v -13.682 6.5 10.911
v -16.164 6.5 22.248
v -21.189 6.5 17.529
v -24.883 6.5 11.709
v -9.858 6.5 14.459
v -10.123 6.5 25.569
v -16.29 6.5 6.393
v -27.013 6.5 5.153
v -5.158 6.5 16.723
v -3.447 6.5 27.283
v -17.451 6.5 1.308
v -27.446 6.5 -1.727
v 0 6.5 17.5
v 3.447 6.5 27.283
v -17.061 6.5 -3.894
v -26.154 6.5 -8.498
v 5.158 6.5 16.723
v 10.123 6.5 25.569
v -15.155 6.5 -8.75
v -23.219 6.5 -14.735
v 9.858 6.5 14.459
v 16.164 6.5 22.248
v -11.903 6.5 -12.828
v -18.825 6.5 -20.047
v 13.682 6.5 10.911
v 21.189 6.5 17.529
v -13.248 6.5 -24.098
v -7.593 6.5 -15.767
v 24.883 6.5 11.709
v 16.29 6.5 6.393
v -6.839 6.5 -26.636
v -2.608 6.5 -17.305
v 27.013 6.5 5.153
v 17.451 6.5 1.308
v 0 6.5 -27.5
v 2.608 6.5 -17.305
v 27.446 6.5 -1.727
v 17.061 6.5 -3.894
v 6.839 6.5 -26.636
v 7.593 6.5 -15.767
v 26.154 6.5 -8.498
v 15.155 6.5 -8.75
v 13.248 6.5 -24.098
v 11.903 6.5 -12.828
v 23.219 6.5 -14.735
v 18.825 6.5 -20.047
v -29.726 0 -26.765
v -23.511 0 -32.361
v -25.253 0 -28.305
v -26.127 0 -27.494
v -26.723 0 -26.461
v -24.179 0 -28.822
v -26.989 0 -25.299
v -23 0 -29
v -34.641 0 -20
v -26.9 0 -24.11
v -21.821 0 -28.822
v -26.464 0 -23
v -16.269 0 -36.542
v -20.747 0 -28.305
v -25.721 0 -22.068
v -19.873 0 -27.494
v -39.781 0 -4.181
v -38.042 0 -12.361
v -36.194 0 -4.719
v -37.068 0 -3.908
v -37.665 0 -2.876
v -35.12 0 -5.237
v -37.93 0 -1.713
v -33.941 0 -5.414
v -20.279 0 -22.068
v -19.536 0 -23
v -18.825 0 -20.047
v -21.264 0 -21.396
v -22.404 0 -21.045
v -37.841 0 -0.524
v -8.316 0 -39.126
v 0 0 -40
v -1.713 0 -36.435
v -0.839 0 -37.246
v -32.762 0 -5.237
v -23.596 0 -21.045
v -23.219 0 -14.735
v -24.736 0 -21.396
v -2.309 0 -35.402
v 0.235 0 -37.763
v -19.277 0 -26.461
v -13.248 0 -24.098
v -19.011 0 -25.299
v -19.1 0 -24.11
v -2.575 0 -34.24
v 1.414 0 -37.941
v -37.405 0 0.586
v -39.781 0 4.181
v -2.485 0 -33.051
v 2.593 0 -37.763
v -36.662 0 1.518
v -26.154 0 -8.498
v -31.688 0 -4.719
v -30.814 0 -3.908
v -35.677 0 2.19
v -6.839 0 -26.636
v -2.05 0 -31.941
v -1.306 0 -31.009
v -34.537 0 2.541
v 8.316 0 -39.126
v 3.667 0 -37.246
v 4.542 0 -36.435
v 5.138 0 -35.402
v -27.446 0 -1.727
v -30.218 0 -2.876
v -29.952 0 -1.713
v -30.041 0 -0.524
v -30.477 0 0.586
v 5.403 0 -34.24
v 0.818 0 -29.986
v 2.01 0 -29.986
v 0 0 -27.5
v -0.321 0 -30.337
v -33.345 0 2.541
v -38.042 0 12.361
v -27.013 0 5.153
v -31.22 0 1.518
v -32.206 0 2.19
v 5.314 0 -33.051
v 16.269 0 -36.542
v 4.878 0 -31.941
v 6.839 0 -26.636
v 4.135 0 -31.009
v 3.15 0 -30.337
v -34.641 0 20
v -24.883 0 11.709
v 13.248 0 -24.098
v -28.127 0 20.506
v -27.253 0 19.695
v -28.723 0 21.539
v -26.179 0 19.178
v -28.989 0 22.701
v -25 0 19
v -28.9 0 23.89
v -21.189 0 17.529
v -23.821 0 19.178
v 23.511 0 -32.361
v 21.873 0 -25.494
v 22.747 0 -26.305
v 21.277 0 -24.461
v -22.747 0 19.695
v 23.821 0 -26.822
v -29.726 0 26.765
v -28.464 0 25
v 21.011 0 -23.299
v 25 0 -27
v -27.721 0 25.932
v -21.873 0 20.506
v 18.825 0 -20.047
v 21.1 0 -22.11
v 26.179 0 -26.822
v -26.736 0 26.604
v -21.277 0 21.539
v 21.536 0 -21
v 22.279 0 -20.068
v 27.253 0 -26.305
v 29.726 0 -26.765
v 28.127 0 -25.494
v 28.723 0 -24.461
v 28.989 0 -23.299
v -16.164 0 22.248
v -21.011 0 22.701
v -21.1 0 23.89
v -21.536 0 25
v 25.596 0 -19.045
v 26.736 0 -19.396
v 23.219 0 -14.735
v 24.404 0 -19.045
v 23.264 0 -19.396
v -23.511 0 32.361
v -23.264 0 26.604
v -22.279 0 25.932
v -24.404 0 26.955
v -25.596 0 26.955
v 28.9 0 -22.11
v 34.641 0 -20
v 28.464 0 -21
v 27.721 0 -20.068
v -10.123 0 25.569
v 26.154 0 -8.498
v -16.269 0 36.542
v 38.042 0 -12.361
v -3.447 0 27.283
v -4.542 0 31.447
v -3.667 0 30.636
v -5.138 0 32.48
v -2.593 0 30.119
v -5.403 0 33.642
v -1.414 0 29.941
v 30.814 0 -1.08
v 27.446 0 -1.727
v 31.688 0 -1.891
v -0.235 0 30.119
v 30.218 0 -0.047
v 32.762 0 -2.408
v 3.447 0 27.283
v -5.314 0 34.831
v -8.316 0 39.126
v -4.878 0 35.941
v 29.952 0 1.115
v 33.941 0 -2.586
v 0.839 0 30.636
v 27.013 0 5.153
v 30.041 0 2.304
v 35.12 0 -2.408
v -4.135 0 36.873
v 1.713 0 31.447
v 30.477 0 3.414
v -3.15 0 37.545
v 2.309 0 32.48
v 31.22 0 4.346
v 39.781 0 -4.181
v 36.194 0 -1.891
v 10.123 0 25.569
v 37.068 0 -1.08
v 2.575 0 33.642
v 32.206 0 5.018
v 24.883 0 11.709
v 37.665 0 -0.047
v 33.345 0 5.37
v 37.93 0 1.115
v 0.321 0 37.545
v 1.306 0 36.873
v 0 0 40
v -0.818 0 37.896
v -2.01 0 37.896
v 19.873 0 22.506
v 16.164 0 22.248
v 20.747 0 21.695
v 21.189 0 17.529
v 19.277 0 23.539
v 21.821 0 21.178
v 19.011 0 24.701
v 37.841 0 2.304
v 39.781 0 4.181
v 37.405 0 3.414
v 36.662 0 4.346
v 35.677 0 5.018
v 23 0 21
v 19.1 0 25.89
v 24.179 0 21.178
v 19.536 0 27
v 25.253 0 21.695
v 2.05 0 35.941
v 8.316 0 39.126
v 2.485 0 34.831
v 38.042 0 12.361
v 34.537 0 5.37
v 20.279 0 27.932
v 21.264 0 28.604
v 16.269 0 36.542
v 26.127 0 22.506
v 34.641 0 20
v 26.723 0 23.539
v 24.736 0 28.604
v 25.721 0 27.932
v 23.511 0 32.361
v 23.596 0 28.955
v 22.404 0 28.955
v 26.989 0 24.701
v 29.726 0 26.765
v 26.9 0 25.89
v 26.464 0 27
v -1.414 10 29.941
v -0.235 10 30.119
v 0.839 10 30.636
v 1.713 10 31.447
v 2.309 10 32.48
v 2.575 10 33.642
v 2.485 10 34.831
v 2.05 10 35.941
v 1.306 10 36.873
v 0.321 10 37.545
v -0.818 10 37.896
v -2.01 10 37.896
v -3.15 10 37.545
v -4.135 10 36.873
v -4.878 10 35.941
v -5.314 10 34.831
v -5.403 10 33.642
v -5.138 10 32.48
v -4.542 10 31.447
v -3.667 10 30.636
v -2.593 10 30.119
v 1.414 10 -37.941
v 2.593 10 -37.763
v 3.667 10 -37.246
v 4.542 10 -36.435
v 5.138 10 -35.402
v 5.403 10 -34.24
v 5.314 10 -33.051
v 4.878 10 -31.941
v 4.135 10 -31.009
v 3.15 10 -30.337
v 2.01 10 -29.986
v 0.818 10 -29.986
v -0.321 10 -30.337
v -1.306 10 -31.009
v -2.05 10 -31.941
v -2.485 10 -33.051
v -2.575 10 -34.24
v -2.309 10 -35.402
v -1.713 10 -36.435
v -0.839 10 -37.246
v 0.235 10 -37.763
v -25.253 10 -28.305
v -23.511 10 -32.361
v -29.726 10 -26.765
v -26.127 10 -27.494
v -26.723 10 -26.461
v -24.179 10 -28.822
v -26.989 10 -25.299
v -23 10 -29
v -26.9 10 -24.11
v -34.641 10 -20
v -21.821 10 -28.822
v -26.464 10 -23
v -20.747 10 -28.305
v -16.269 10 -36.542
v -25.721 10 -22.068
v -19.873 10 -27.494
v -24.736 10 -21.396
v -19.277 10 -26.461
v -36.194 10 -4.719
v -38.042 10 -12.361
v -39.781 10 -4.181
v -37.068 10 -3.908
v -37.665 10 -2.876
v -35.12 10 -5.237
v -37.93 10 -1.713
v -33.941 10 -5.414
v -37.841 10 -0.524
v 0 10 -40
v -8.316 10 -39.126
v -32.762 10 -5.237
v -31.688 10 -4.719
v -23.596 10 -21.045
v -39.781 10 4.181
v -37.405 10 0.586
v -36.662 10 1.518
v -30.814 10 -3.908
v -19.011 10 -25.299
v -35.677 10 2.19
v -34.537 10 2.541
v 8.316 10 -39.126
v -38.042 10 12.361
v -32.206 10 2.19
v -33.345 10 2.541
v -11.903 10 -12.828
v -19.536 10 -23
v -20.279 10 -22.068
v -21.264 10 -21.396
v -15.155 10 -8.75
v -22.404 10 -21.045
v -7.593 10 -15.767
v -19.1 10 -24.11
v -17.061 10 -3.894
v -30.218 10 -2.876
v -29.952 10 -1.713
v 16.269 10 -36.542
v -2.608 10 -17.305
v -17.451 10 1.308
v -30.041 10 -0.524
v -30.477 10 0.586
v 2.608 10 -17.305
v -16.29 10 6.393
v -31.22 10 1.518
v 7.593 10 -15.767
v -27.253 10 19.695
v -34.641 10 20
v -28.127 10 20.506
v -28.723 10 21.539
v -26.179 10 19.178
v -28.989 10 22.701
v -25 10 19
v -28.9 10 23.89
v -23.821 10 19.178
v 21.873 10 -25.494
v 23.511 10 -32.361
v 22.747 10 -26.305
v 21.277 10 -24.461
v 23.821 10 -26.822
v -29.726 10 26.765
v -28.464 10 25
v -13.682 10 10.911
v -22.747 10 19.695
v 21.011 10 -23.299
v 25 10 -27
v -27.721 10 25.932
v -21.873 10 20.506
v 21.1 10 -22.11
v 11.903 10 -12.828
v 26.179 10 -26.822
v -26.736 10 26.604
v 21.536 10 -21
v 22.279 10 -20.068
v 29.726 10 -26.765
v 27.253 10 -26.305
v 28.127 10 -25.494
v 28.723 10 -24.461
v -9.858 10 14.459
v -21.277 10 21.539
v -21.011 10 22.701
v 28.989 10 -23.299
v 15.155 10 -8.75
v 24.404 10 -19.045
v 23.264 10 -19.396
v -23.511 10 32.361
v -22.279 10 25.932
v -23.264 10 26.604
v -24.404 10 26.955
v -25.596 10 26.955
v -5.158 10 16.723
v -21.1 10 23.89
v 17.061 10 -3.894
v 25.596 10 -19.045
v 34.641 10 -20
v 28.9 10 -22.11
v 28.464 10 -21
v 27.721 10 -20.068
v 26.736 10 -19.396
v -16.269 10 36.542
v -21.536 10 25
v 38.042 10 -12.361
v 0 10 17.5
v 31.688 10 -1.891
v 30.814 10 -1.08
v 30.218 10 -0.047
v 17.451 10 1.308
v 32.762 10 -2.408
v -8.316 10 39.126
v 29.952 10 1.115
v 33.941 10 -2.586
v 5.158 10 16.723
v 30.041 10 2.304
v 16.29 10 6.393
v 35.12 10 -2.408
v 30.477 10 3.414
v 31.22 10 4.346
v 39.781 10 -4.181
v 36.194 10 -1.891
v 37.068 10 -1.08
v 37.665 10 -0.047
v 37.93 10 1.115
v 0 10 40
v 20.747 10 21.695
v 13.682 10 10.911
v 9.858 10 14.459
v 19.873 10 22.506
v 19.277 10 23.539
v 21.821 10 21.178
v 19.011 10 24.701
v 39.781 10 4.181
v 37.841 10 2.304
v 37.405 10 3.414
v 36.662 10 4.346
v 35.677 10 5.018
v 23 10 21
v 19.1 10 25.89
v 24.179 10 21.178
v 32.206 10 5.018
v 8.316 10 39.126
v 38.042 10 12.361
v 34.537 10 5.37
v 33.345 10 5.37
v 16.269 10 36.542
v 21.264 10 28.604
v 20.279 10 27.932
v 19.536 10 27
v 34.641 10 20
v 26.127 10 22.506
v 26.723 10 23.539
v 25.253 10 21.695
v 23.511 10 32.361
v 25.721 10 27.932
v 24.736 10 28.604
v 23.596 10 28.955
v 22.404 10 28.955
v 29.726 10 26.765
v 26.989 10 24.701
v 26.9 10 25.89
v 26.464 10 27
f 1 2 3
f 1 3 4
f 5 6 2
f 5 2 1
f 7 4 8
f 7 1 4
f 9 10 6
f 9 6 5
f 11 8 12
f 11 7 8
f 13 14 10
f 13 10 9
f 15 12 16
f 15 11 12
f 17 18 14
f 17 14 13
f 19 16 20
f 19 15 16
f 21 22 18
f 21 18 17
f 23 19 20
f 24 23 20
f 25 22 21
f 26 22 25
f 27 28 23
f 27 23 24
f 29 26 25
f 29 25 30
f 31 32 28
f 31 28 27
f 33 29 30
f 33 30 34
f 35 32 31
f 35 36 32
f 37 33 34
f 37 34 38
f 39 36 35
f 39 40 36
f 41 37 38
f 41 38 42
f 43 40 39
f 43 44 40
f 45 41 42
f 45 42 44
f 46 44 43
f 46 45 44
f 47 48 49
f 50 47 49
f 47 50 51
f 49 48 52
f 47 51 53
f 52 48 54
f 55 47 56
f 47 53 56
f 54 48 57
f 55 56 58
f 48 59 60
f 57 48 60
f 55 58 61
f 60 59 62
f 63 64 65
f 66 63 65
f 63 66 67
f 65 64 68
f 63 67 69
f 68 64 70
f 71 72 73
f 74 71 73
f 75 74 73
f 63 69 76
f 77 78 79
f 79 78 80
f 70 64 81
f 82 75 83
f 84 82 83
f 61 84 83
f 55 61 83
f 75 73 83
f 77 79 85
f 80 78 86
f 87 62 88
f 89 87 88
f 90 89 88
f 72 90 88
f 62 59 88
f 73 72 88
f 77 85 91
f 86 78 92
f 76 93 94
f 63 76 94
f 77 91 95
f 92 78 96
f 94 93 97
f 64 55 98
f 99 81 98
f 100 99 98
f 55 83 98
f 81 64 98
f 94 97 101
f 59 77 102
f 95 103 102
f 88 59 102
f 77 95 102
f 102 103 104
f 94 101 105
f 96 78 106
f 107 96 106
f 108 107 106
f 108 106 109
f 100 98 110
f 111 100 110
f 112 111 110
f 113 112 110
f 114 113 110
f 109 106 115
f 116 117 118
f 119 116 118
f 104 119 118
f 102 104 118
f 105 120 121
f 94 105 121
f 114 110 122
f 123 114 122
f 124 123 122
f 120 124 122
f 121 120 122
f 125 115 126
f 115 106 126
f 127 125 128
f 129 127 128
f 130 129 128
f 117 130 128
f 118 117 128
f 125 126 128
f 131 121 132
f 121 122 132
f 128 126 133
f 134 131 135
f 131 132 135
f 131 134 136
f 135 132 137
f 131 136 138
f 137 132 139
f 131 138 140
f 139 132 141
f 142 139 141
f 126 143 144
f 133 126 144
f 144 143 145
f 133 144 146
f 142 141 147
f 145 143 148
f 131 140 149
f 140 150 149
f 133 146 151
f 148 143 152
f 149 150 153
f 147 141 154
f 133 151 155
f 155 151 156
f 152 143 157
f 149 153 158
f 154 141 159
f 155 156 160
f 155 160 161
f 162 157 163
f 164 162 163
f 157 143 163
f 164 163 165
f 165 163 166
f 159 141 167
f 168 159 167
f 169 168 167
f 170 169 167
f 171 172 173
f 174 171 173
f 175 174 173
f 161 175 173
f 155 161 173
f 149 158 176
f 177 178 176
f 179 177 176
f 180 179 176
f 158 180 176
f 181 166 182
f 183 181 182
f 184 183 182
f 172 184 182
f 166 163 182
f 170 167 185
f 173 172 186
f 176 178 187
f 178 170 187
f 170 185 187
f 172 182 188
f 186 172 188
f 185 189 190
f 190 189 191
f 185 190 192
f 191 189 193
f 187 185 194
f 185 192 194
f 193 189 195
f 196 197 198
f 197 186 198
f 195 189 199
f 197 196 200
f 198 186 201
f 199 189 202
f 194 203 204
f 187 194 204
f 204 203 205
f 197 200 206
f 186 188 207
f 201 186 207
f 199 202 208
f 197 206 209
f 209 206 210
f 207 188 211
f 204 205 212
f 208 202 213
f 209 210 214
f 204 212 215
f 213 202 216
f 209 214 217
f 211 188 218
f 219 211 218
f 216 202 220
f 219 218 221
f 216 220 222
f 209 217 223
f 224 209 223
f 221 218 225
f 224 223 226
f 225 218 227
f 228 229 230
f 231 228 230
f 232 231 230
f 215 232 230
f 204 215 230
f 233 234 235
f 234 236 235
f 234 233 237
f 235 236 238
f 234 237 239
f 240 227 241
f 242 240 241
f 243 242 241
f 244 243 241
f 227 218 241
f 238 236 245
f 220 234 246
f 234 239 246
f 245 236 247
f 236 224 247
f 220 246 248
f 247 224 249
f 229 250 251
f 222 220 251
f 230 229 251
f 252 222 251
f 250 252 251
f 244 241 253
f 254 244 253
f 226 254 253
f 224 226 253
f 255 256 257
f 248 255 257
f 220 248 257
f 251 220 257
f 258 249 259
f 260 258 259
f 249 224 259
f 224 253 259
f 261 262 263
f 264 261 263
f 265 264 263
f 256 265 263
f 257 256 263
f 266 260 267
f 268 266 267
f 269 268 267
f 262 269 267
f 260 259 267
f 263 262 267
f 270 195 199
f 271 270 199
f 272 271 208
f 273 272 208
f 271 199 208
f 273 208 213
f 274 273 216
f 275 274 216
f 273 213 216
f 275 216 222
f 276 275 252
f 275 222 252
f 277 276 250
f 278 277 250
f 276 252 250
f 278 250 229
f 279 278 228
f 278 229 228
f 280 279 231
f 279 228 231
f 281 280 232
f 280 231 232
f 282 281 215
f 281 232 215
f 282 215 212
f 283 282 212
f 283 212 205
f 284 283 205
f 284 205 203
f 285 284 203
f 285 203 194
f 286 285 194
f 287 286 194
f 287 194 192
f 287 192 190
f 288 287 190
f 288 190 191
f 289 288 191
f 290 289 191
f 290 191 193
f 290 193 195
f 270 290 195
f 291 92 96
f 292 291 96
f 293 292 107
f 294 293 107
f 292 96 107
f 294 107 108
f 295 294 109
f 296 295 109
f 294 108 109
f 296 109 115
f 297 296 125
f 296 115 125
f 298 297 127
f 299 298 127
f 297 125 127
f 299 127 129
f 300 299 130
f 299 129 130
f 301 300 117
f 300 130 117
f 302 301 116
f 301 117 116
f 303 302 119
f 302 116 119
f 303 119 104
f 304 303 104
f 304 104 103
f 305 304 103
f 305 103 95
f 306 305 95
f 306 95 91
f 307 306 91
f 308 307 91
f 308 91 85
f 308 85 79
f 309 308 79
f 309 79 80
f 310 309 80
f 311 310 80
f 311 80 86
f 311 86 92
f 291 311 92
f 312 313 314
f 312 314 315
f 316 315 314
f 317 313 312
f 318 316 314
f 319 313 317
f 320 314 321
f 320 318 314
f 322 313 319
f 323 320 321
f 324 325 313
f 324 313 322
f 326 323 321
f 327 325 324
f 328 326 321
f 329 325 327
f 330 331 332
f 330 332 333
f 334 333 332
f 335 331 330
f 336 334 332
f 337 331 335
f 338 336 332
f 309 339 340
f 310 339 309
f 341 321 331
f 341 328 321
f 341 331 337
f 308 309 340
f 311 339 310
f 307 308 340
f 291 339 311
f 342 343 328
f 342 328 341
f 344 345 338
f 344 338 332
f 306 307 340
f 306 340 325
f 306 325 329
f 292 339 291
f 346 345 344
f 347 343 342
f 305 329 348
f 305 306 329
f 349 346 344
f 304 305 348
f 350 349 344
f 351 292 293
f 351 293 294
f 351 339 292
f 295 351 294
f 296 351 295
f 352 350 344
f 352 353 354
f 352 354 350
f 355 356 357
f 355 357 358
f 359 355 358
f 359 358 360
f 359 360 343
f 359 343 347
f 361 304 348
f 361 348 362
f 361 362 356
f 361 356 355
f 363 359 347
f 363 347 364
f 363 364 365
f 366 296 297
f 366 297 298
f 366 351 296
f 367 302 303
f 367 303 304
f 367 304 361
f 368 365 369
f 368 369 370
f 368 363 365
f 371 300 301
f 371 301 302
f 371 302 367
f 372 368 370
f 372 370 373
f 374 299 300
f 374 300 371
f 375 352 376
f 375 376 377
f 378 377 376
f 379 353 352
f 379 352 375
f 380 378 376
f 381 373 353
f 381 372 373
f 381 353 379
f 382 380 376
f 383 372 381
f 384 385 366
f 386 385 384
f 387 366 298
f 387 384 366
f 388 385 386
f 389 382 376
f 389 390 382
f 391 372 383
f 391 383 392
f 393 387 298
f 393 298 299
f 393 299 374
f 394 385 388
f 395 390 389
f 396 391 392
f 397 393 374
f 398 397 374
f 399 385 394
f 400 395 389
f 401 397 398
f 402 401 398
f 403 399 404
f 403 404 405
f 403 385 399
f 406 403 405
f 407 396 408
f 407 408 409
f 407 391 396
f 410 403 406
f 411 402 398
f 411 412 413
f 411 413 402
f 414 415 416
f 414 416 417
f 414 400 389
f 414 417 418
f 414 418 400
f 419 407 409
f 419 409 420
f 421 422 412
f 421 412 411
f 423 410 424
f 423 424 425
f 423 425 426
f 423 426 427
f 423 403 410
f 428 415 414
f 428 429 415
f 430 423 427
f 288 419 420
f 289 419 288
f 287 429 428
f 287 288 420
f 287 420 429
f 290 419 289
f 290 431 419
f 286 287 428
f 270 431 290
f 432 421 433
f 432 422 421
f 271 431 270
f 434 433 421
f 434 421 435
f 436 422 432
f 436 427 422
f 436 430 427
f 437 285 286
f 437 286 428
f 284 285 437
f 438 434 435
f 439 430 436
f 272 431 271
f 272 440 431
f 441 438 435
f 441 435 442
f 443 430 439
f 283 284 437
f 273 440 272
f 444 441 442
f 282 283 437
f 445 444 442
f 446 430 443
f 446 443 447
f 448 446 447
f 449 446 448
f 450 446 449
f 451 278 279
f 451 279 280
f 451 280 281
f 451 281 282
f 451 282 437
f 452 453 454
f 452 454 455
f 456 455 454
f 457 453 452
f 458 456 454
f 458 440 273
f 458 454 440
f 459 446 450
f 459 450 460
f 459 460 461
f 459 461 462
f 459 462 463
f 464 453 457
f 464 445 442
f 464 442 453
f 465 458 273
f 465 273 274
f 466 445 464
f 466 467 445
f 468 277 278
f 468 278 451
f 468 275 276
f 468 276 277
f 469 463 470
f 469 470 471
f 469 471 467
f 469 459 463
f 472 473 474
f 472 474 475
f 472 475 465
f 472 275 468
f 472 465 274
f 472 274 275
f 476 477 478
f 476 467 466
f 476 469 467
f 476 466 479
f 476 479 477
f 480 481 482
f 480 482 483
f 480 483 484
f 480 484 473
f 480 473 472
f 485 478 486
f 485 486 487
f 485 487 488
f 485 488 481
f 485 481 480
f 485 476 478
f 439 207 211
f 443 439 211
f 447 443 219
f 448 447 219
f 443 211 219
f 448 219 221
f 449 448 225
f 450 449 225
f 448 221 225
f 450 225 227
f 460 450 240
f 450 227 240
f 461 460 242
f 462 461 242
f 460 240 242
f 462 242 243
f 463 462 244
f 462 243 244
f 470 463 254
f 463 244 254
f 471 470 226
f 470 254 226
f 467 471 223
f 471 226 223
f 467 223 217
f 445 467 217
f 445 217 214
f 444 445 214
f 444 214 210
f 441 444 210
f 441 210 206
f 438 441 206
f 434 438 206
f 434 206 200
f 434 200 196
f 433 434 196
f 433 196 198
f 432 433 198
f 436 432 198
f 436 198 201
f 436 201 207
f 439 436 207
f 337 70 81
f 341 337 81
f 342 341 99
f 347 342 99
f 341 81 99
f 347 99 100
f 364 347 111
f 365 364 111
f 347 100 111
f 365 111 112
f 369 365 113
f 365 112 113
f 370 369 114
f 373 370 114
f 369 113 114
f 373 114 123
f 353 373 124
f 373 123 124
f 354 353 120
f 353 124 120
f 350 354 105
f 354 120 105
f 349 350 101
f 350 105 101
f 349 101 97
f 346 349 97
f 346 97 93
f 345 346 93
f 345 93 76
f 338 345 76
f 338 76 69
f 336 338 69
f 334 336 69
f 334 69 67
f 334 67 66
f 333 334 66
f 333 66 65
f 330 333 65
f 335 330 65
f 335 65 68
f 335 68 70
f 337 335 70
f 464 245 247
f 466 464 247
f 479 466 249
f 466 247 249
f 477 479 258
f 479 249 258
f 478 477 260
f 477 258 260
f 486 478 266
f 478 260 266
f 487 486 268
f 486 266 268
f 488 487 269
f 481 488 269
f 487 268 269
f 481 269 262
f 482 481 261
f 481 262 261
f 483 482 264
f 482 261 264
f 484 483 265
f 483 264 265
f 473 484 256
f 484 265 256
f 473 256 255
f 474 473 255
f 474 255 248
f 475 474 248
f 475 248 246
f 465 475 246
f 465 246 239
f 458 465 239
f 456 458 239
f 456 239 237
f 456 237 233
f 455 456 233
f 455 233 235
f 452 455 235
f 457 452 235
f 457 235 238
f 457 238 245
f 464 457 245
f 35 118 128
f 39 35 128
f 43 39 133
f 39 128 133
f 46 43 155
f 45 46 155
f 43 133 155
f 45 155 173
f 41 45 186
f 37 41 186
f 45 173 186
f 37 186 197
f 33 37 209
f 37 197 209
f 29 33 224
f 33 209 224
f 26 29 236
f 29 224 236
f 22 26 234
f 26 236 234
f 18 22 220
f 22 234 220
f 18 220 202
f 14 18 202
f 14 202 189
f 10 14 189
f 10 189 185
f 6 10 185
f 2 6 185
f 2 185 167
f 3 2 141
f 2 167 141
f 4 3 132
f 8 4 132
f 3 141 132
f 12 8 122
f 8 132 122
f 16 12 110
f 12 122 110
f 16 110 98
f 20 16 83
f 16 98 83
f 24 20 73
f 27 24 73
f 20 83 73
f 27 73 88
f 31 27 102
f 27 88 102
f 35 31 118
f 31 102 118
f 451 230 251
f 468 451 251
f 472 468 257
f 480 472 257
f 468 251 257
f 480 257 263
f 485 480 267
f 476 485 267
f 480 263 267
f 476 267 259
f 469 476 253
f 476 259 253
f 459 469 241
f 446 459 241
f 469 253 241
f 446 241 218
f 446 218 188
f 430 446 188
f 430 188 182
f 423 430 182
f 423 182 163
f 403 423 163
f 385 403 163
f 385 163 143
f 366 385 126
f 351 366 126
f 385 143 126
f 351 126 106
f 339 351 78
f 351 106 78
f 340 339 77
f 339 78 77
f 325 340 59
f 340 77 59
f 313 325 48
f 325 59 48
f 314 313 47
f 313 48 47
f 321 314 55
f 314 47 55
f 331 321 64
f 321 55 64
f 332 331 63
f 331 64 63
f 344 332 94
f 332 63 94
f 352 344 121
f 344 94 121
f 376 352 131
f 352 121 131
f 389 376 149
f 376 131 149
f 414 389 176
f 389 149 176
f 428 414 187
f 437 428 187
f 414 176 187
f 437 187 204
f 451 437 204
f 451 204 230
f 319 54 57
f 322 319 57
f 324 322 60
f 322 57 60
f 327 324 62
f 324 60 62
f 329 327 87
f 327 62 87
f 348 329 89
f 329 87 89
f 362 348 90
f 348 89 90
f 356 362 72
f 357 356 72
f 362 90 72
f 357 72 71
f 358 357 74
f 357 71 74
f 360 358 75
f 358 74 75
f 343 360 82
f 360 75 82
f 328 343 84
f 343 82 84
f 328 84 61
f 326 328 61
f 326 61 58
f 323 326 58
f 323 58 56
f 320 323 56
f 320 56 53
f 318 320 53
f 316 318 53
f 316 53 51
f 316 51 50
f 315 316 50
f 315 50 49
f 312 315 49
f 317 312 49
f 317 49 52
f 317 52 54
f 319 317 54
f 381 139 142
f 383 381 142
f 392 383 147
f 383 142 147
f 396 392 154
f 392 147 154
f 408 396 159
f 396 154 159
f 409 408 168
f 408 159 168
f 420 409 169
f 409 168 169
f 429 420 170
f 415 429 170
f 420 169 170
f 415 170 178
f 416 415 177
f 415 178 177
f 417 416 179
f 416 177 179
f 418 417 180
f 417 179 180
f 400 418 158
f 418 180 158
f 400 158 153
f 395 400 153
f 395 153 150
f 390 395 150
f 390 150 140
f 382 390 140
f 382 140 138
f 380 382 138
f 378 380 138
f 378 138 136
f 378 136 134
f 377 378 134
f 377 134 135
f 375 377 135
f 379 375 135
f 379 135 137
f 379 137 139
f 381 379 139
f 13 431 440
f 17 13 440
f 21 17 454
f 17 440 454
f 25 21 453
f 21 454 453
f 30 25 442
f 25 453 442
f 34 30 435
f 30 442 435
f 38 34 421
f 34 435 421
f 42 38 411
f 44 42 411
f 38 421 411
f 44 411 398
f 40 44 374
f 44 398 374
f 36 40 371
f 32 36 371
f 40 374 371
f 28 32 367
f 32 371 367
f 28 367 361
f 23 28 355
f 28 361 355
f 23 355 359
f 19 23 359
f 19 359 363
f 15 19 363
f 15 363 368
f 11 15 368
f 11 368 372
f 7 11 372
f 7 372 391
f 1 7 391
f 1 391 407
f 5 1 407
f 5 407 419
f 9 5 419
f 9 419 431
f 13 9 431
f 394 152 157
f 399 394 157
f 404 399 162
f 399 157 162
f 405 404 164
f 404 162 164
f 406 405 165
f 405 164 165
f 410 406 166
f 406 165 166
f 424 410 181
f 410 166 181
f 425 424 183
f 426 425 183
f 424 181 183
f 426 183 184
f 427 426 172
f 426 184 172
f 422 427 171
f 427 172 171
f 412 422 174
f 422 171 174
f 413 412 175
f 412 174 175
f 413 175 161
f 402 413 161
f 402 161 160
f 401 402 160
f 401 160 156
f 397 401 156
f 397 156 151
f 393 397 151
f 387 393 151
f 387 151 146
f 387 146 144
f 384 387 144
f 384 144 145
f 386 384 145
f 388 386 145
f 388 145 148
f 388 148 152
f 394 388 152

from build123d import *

# Parameters (mm, degrees)
SKETCH1_R           = 40
BOSS_EXTRUDE1_DEPTH = 10
SKETCH3_R           = 27.5
CUT_EXTRUDE2_DEPTH  = 6.5
SKETCH4_R           = 17.5
CUT_EXTRUDE3_DEPTH  = 58.445626465
SKETCH5_R           = 4
CUT_EXTRUDE4_DEPTH  = 58.445626465


with BuildPart() as part:
    # Sketch1 → Boss-Extrude1 (new body)
    with BuildSketch(Plane(origin=(0, 0, 0), x_dir=(1, 0, 0), z_dir=(0, 1, 0))):
        with Locations(Location((0, 0, 0), (0, 0, 270))):
            Circle(SKETCH1_R)
    extrude(amount=BOSS_EXTRUDE1_DEPTH)

    # Sketch3 → Cut-Extrude2 (cut)
    with BuildSketch(Plane.XZ):
        with Locations(Location((0, 0, 0), (0, 0, 270))):
            Circle(SKETCH3_R)
    extrude(amount=-CUT_EXTRUDE2_DEPTH, mode=Mode.SUBTRACT)

    # Sketch4 → Cut-Extrude3 (cut, through all)
    with BuildSketch(Plane(origin=(0, 10, 0), x_dir=(1, 0, 0), z_dir=(0, 1, 0))):
        with Locations(Location((0, 0, 0), (0, 0, 270))):
            Circle(SKETCH4_R)
    extrude(amount=-CUT_EXTRUDE3_DEPTH, mode=Mode.SUBTRACT)

    # Sketch5 → Cut-Extrude4 (cut, through all)
    with BuildSketch(Plane.XZ):
        with Locations(Location((-25, 23, 0), (0, 0, 270))):
            Circle(SKETCH5_R)
        with Locations(Location((-1.414213562, 33.941125497, 0), (0, 0, 270))):
            Circle(SKETCH5_R)
        with Locations(Location((23, 25, 0), (0, 0, 270))):
            Circle(SKETCH5_R)
        with Locations(Location((33.941125497, 1.414213562, 0), (0, 0, 270))):
            Circle(SKETCH5_R)
        with Locations(Location((25, -23, 0), (0, 0, 270))):
            Circle(SKETCH5_R)
        with Locations(Location((1.414213562, -33.941125497, 0), (0, 0, 270))):
            Circle(SKETCH5_R)
        with Locations(Location((-23, -25, 0), (0, 0, 270))):
            Circle(SKETCH5_R)
        with Locations(Location((-33.941125497, -1.414213562, 0), (0, 0, 270))):
            Circle(SKETCH5_R)
    extrude(amount=-CUT_EXTRUDE4_DEPTH, mode=Mode.SUBTRACT)


solid = part.part
